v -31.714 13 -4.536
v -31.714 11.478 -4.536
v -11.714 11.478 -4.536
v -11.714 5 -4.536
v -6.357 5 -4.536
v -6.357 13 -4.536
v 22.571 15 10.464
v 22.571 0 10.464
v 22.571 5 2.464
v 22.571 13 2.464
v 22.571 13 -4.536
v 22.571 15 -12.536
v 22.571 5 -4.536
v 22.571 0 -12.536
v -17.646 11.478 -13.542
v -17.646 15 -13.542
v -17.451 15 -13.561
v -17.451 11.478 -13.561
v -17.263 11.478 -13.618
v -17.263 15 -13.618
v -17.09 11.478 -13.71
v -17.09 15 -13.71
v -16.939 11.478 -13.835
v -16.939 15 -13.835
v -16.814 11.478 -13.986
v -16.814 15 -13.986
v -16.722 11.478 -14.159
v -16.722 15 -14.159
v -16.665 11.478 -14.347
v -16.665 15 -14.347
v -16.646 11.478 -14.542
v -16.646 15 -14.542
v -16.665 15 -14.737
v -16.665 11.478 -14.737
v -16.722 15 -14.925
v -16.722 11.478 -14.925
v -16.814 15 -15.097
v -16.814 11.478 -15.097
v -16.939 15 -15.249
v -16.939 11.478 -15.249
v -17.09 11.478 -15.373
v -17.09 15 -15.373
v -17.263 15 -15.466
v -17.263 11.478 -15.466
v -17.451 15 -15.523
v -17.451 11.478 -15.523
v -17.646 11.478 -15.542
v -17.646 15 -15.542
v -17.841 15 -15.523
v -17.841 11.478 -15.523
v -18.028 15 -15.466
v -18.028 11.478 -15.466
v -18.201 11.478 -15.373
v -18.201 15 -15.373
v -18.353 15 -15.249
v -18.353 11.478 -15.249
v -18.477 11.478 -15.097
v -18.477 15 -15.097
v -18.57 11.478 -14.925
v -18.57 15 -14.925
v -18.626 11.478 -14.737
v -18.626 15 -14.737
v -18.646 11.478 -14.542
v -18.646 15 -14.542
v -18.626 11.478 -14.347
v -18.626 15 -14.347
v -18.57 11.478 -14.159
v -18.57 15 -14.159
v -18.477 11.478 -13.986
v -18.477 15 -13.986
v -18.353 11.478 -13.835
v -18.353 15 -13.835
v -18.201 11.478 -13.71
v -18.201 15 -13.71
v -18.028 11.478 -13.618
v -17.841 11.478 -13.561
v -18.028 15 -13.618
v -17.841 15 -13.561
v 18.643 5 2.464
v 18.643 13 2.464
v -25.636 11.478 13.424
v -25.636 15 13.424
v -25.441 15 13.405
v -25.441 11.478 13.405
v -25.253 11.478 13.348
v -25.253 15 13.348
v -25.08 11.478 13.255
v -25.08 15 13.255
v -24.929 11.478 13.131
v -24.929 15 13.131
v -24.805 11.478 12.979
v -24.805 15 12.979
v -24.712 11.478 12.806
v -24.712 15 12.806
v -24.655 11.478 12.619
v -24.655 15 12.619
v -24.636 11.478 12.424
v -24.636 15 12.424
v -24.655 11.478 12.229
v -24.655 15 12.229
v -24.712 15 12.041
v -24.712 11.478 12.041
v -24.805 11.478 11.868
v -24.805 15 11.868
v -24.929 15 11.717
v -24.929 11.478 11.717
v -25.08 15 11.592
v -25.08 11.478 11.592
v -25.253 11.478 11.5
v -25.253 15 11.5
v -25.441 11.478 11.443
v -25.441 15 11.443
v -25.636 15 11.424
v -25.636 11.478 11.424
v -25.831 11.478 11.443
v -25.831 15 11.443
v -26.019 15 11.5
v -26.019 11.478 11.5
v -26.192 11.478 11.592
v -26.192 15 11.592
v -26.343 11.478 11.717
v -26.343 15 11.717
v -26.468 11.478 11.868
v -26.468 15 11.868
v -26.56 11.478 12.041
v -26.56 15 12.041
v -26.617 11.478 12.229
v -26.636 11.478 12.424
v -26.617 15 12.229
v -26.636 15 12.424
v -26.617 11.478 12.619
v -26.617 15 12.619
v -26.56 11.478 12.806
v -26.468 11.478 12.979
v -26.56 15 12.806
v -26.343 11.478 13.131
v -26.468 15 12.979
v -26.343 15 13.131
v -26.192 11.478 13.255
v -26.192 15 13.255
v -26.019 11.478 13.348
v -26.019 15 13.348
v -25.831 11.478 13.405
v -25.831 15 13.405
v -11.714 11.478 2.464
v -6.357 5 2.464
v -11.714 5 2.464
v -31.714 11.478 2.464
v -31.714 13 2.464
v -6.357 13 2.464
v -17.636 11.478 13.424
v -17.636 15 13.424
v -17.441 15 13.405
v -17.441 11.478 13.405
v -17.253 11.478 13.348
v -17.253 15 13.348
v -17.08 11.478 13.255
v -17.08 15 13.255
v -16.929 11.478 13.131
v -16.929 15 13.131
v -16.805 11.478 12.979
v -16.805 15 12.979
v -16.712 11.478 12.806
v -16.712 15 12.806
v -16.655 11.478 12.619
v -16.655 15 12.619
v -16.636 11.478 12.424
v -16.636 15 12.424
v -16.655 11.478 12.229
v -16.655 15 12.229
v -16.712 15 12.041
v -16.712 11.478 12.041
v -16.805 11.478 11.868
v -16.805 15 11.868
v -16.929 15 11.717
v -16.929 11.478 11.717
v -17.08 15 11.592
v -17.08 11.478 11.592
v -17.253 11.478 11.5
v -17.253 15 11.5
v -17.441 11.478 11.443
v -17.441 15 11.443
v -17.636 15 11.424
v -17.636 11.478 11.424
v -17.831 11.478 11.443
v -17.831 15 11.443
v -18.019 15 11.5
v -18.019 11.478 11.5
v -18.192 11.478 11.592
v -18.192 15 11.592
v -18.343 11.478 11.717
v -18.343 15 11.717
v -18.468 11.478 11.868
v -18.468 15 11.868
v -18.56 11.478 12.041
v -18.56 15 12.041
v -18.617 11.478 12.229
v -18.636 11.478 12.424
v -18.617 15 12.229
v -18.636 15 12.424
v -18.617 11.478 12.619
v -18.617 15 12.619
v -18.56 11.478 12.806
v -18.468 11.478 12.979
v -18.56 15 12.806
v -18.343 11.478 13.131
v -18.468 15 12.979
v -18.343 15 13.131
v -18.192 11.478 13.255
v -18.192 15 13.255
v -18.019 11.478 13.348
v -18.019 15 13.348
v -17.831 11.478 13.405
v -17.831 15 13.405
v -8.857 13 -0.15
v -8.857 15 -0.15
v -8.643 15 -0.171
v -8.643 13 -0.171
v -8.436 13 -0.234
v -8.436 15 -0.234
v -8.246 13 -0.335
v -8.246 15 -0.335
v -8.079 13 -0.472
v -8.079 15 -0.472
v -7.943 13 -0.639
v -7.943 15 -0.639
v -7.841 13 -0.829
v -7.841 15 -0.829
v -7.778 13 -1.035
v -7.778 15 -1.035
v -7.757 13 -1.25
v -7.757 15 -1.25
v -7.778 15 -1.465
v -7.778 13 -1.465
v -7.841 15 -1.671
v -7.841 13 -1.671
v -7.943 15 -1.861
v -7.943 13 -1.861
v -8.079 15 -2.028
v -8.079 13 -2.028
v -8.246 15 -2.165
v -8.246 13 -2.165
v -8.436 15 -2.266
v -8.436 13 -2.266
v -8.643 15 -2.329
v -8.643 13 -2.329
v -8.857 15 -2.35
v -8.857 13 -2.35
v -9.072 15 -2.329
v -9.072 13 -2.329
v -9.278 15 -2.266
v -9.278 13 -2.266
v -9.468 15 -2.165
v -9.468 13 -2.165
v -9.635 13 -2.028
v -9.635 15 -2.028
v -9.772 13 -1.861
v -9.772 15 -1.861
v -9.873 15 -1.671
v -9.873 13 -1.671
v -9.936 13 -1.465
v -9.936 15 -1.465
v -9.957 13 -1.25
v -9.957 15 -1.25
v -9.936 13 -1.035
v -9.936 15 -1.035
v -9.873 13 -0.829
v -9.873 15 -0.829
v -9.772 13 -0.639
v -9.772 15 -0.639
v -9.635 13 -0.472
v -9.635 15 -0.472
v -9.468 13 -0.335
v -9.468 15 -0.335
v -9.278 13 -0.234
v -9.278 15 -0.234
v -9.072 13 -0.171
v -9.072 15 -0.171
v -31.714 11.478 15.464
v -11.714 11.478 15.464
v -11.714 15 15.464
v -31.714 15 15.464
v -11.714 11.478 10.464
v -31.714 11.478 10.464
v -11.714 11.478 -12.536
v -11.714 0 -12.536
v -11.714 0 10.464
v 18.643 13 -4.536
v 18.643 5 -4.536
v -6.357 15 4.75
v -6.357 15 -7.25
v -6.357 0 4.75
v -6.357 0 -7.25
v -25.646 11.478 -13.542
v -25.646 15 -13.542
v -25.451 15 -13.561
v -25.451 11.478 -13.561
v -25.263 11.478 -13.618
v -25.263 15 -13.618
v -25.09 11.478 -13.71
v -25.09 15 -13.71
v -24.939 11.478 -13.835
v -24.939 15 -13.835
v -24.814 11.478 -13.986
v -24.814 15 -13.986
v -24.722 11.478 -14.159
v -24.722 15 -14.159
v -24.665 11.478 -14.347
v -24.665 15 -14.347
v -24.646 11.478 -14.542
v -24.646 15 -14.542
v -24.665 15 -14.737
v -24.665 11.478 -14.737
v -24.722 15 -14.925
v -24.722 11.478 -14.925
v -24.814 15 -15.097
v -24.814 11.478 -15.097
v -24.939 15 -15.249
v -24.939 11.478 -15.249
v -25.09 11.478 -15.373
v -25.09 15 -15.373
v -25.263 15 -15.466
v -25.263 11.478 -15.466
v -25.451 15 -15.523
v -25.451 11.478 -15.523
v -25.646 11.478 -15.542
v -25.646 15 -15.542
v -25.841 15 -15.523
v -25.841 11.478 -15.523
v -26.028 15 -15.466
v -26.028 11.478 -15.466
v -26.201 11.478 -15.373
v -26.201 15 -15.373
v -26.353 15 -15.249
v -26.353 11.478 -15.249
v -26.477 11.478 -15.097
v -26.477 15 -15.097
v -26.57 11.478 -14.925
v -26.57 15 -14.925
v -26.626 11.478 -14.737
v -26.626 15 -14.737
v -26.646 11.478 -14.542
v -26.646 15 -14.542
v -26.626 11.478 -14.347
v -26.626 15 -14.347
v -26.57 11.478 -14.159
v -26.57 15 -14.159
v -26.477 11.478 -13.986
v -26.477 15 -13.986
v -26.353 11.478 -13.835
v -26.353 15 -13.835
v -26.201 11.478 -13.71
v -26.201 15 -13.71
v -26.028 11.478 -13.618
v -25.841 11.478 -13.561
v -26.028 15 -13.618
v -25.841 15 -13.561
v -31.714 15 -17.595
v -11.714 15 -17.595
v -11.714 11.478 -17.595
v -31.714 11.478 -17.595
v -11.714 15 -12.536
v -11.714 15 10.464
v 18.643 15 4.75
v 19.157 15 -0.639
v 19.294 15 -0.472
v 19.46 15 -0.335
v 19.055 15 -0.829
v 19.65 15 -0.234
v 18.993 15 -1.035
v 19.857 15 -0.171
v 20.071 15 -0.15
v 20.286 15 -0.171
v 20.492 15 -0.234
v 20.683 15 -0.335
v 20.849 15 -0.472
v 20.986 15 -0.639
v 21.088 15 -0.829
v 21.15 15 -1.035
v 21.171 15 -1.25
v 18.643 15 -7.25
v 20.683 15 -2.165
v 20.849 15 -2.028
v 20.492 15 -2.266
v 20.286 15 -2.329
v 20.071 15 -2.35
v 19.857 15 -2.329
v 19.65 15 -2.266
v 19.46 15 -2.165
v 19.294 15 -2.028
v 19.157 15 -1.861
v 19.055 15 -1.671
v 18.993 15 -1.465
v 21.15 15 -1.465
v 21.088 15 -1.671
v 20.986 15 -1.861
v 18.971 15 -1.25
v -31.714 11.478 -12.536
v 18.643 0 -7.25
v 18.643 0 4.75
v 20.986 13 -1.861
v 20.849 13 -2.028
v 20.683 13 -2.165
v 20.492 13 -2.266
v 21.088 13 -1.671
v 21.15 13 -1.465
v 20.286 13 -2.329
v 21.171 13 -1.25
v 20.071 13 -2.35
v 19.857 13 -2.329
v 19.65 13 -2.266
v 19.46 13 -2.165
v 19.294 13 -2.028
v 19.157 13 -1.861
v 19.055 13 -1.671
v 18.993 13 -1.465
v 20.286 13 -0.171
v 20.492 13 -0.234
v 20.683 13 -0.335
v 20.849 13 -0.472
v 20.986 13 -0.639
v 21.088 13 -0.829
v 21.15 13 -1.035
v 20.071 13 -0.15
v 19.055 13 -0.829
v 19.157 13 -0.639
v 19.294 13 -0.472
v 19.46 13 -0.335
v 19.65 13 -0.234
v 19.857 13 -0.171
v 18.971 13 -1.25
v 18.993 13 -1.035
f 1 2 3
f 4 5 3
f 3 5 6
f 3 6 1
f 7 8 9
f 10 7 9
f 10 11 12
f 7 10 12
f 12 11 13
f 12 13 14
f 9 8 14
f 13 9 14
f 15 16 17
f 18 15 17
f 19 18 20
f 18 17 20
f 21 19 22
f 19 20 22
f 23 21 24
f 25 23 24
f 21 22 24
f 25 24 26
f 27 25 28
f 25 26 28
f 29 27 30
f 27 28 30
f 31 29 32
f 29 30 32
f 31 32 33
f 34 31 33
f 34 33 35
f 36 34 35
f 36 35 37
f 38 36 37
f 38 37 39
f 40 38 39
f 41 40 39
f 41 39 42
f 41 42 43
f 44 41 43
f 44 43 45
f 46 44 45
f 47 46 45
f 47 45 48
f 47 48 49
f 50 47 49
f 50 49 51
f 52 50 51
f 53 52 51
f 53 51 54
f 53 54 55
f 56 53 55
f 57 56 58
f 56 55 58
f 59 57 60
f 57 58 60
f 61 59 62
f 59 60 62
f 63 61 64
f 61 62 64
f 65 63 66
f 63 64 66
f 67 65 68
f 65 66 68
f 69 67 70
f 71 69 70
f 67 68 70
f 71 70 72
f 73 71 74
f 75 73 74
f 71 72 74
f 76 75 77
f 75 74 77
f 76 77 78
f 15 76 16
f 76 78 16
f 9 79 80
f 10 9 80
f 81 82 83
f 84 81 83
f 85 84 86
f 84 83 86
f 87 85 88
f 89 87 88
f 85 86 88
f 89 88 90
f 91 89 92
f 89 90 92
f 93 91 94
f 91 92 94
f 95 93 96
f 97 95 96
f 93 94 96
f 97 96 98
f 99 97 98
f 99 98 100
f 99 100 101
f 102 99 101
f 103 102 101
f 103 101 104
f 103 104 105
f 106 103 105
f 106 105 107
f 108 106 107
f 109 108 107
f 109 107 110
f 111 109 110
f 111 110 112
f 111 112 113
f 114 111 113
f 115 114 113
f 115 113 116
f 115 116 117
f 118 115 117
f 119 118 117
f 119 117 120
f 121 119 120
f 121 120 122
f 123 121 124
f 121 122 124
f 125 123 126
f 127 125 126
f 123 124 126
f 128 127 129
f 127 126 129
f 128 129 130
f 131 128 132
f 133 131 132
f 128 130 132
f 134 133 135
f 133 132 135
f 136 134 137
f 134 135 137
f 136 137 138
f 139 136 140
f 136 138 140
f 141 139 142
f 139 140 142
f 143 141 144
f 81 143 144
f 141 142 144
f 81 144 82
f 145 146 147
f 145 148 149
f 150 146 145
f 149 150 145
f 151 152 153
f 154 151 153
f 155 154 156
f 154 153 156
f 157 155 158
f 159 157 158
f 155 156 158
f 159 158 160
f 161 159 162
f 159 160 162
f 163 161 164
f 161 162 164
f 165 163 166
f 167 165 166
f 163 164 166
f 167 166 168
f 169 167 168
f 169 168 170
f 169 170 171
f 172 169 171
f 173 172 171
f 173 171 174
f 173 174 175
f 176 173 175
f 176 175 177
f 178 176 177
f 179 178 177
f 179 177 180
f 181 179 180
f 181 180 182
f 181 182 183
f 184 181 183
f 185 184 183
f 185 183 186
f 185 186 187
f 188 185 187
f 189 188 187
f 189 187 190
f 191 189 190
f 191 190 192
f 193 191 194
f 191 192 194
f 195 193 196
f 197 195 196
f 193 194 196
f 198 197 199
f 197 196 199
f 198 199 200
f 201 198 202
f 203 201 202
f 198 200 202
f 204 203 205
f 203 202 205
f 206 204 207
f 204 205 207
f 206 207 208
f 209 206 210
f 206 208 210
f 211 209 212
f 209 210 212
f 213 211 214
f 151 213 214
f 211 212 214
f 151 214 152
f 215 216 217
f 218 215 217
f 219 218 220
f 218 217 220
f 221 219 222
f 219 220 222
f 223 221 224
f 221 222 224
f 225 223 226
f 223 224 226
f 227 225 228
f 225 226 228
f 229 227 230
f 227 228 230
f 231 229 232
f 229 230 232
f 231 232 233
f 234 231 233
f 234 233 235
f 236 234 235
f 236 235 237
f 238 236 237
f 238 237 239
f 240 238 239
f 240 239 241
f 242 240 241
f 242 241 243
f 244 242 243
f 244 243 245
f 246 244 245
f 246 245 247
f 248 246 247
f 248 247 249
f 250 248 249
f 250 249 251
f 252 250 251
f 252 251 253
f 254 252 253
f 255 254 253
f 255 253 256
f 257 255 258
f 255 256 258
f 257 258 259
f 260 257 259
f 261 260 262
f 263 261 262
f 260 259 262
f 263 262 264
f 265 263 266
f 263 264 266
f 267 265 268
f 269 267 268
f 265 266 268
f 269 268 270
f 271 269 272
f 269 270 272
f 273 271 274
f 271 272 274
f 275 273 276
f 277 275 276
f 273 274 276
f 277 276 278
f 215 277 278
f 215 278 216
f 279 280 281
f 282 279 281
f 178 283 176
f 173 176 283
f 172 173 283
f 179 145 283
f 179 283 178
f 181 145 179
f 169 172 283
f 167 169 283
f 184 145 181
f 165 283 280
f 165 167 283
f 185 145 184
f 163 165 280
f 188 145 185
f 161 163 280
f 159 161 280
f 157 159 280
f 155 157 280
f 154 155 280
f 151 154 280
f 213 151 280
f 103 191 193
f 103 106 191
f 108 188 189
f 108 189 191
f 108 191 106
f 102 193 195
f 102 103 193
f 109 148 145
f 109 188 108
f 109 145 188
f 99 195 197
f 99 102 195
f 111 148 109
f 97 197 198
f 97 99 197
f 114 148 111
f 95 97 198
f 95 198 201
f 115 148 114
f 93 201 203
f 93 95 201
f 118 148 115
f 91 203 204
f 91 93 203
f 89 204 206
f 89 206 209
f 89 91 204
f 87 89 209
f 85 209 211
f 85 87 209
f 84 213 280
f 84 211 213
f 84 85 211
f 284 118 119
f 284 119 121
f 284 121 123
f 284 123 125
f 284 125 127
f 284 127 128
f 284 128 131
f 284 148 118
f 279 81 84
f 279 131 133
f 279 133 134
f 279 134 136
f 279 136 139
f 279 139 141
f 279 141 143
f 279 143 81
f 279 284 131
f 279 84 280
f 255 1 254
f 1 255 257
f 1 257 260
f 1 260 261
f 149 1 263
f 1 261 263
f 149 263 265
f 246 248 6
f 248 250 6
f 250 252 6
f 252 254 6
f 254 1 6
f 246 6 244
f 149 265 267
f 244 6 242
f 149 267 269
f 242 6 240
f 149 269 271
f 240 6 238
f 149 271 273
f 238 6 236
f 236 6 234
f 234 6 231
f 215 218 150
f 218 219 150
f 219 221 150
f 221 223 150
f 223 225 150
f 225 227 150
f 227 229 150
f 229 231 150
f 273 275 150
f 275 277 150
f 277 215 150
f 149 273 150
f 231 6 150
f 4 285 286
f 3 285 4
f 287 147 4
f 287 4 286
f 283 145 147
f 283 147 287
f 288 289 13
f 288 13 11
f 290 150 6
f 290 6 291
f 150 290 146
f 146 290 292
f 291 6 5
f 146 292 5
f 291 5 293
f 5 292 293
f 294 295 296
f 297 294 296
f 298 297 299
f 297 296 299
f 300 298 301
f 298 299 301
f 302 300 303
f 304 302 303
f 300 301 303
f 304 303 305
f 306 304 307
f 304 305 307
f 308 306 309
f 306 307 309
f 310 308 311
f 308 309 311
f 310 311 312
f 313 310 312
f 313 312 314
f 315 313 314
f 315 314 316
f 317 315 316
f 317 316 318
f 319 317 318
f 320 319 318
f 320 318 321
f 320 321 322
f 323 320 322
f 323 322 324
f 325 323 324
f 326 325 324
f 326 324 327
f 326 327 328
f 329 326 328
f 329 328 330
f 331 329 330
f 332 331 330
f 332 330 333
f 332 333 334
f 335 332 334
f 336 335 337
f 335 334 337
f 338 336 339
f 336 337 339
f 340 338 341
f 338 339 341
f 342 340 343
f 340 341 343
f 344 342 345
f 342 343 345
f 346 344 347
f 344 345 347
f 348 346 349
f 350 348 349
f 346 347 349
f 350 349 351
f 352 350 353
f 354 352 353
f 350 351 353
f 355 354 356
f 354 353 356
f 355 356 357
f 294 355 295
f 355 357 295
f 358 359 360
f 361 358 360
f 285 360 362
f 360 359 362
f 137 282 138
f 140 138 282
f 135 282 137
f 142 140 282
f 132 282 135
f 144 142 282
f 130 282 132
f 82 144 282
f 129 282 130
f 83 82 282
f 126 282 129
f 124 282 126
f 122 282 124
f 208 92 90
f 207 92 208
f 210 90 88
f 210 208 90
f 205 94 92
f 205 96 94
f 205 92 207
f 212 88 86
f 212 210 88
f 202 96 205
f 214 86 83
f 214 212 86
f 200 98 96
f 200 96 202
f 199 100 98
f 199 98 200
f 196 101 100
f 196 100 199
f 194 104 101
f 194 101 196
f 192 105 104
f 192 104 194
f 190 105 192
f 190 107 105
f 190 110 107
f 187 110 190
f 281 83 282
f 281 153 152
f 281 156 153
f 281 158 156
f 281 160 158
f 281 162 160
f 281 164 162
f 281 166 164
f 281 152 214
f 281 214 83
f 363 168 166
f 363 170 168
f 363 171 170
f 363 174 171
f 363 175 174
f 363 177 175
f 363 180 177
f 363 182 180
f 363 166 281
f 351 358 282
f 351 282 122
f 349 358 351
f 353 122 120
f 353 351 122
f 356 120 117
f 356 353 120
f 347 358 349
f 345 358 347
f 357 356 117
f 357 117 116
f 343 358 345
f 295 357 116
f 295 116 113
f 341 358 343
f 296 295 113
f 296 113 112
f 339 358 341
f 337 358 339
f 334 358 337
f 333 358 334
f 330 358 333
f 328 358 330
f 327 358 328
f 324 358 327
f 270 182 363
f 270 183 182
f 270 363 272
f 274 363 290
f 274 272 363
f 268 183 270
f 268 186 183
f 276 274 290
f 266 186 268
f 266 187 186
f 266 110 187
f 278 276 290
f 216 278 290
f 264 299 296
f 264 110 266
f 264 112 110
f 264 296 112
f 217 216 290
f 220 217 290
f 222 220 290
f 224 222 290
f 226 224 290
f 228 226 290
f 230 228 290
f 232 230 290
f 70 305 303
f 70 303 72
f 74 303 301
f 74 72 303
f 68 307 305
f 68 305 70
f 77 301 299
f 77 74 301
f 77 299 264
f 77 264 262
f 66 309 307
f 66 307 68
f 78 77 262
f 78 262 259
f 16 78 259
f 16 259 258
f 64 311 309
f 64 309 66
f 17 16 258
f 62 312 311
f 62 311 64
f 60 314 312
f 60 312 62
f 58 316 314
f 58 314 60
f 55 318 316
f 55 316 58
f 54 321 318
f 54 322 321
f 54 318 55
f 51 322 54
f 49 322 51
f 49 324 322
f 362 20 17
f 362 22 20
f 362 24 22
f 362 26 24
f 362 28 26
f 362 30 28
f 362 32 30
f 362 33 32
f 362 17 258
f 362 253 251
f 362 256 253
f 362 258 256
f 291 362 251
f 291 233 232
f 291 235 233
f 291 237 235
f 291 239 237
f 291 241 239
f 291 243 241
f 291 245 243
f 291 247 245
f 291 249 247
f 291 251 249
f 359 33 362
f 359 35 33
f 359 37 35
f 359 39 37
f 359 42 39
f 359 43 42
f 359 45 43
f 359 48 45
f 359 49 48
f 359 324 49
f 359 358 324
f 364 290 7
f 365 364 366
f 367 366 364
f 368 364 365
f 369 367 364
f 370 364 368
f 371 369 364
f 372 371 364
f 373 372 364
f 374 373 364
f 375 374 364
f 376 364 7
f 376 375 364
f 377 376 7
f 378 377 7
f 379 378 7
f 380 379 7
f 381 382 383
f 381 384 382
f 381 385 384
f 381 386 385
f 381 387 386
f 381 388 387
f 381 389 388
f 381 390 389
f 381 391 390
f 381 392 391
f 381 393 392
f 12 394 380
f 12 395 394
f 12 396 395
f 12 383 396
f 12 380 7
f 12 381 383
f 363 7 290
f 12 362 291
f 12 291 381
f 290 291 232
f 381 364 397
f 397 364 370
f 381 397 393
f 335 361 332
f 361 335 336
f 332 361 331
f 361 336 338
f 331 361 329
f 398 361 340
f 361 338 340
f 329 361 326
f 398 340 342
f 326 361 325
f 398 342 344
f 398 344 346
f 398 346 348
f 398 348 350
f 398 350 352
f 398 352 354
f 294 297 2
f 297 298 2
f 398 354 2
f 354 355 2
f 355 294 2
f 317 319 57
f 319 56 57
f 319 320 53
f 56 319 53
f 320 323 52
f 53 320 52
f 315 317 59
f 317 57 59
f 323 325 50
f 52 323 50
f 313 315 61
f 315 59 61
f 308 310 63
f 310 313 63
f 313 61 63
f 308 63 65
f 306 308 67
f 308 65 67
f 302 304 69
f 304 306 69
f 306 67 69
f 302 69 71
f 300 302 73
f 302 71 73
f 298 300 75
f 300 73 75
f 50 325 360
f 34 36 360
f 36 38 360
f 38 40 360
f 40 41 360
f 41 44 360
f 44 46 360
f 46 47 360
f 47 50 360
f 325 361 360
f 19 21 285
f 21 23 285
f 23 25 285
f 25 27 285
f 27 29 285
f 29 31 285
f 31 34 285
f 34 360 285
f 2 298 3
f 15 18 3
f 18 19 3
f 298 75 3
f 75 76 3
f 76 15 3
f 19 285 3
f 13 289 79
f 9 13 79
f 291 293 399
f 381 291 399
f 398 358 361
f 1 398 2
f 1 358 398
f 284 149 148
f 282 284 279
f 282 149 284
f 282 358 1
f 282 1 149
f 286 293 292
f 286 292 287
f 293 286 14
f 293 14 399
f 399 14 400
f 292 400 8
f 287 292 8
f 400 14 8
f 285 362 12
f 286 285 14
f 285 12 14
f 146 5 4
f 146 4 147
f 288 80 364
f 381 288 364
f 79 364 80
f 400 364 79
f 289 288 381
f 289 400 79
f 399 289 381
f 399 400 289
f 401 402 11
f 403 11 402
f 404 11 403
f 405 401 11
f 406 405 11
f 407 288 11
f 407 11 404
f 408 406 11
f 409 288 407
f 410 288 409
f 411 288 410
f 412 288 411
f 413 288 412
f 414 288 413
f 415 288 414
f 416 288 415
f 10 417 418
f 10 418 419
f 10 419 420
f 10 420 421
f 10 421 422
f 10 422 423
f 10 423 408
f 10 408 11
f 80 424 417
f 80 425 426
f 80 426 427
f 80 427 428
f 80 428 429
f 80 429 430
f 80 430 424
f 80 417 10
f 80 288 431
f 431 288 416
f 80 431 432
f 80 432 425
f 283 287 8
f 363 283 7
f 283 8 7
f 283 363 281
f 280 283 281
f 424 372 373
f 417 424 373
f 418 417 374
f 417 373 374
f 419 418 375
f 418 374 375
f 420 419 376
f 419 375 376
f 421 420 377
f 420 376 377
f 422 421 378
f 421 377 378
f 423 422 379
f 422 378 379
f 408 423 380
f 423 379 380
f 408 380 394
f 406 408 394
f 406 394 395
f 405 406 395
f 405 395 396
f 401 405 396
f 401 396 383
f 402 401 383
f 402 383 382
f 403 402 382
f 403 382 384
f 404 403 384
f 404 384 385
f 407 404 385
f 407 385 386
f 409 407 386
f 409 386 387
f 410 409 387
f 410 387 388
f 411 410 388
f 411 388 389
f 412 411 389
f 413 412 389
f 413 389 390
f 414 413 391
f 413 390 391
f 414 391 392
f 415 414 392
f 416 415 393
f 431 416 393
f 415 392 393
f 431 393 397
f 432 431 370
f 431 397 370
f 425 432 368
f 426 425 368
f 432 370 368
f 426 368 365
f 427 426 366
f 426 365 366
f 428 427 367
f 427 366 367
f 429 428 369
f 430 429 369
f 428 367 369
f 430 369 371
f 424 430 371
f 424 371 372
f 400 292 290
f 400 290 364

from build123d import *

# Parameters (mm, degrees)
ESQUISSE1_W             = 34.285714285
ESQUISSE1_H             = 23
ESQUISSE1_W_2           = 25
ESQUISSE1_H_2           = 12
BOSS_EXTRU_1_DEPTH      = 15
ESQUISSE2_W             = 7
ESQUISSE2_H             = 8
ENL_V_MAT_EXTRU_1_DEPTH = 60
ESQUISSE3_R             = 1.1
ENL_V_MAT_EXTRU_2_DEPTH = 10
ESQUISSE4_W             = 7
ESQUISSE4_H             = 8
BOSS_EXTRU_2_DEPTH      = 20
ESQUISSE7_W             = 23
ESQUISSE7_H             = 11.477873567
ENL_V_MAT_EXTRU_3_DEPTH = 20
ESQUISSE6_R             = 1
ENL_V_MAT_EXTRU_4_DEPTH = 20


with BuildPart() as part:
    # Esquisse1 → Boss.-Extru.1 (new body)
    with BuildSketch(Plane(origin=(0, 0, 0), x_dir=(1, 0, 0), z_dir=(0, 1, 0))):
        with Locations((5.428571429, 1.035714286)):
            Rectangle(ESQUISSE1_W, ESQUISSE1_H)
        with Locations((6.142857143, 1.25)):
            Rectangle(ESQUISSE1_W_2, ESQUISSE1_H_2, mode=Mode.SUBTRACT)
    extrude(amount=BOSS_EXTRU_1_DEPTH)

    # Esquisse2 → Enlèv. mat.-Extru.1 (cut)
    with BuildSketch(Plane.ZY.offset(11.714285714)):
        with Locations((-1.035714286, 9)):
            Rectangle(ESQUISSE2_W, ESQUISSE2_H)
    extrude(amount=-ENL_V_MAT_EXTRU_1_DEPTH, mode=Mode.SUBTRACT)

    # Esquisse3 → Enlèv. mat.-Extru.2 (cut)
    with BuildSketch(Plane(origin=(0, 15, 0), x_dir=(1, 0, 0), z_dir=(0, 1, 0))):
        with Locations(Location((-8.857142857, 1.25, 0), (0, 0, 270))):
            Circle(ESQUISSE3_R)
        with Locations(Location((20.071428571, 1.25, 0), (0, 0, 270))):
            Circle(ESQUISSE3_R)
    extrude(amount=-ENL_V_MAT_EXTRU_2_DEPTH, mode=Mode.SUBTRACT)

    # Esquisse4 → Boss.-Extru.2 (add)
    with BuildSketch(Plane.ZY.offset(11.714285714)):
        Polygon((-12.535714286, 11.477873567), (-12.535714286, 0), (10.464285714, 0), (10.464285714, 11.477873567), (15.464285714, 11.477873567), (15.464285714, 15), (-17.595238813, 15), (-17.595238813, 11.477873567), align=None)
        with Locations((-1.035714286, 9)):
            Rectangle(ESQUISSE4_W, ESQUISSE4_H, mode=Mode.SUBTRACT)
    extrude(amount=BOSS_EXTRU_2_DEPTH)

    # Esquisse7 → Enlèv. mat.-Extru.3 (cut)
    with BuildSketch(Plane.ZY.offset(31.714285714)):
        with Locations((-1.035714286, 5.738936784)):
            Rectangle(ESQUISSE7_W, ESQUISSE7_H)
    extrude(amount=-ENL_V_MAT_EXTRU_3_DEPTH, mode=Mode.SUBTRACT)

    # Esquisse6 → Enlèv. mat.-Extru.4 (cut)
    with BuildSketch(Plane(origin=(0, 15, 0), x_dir=(1, 0, 0), z_dir=(0, 1, 0))):
        with Locations(Location((-25.64568933, 14.541881164, 0), (0, 0, 270))):
            Circle(ESQUISSE6_R)
        with Locations(Location((-17.64568933, 14.541881164, 0), (0, 0, 270))):
            Circle(ESQUISSE6_R)
        with Locations(Location((-25.636053252, -12.423788749, 0), (0, 0, 270))):
            Circle(ESQUISSE6_R)
        with Locations(Location((-17.636053252, -12.423788749, 0), (0, 0, 270))):
            Circle(ESQUISSE6_R)
    extrude(amount=-ENL_V_MAT_EXTRU_4_DEPTH, mode=Mode.SUBTRACT)


solid = part.part
